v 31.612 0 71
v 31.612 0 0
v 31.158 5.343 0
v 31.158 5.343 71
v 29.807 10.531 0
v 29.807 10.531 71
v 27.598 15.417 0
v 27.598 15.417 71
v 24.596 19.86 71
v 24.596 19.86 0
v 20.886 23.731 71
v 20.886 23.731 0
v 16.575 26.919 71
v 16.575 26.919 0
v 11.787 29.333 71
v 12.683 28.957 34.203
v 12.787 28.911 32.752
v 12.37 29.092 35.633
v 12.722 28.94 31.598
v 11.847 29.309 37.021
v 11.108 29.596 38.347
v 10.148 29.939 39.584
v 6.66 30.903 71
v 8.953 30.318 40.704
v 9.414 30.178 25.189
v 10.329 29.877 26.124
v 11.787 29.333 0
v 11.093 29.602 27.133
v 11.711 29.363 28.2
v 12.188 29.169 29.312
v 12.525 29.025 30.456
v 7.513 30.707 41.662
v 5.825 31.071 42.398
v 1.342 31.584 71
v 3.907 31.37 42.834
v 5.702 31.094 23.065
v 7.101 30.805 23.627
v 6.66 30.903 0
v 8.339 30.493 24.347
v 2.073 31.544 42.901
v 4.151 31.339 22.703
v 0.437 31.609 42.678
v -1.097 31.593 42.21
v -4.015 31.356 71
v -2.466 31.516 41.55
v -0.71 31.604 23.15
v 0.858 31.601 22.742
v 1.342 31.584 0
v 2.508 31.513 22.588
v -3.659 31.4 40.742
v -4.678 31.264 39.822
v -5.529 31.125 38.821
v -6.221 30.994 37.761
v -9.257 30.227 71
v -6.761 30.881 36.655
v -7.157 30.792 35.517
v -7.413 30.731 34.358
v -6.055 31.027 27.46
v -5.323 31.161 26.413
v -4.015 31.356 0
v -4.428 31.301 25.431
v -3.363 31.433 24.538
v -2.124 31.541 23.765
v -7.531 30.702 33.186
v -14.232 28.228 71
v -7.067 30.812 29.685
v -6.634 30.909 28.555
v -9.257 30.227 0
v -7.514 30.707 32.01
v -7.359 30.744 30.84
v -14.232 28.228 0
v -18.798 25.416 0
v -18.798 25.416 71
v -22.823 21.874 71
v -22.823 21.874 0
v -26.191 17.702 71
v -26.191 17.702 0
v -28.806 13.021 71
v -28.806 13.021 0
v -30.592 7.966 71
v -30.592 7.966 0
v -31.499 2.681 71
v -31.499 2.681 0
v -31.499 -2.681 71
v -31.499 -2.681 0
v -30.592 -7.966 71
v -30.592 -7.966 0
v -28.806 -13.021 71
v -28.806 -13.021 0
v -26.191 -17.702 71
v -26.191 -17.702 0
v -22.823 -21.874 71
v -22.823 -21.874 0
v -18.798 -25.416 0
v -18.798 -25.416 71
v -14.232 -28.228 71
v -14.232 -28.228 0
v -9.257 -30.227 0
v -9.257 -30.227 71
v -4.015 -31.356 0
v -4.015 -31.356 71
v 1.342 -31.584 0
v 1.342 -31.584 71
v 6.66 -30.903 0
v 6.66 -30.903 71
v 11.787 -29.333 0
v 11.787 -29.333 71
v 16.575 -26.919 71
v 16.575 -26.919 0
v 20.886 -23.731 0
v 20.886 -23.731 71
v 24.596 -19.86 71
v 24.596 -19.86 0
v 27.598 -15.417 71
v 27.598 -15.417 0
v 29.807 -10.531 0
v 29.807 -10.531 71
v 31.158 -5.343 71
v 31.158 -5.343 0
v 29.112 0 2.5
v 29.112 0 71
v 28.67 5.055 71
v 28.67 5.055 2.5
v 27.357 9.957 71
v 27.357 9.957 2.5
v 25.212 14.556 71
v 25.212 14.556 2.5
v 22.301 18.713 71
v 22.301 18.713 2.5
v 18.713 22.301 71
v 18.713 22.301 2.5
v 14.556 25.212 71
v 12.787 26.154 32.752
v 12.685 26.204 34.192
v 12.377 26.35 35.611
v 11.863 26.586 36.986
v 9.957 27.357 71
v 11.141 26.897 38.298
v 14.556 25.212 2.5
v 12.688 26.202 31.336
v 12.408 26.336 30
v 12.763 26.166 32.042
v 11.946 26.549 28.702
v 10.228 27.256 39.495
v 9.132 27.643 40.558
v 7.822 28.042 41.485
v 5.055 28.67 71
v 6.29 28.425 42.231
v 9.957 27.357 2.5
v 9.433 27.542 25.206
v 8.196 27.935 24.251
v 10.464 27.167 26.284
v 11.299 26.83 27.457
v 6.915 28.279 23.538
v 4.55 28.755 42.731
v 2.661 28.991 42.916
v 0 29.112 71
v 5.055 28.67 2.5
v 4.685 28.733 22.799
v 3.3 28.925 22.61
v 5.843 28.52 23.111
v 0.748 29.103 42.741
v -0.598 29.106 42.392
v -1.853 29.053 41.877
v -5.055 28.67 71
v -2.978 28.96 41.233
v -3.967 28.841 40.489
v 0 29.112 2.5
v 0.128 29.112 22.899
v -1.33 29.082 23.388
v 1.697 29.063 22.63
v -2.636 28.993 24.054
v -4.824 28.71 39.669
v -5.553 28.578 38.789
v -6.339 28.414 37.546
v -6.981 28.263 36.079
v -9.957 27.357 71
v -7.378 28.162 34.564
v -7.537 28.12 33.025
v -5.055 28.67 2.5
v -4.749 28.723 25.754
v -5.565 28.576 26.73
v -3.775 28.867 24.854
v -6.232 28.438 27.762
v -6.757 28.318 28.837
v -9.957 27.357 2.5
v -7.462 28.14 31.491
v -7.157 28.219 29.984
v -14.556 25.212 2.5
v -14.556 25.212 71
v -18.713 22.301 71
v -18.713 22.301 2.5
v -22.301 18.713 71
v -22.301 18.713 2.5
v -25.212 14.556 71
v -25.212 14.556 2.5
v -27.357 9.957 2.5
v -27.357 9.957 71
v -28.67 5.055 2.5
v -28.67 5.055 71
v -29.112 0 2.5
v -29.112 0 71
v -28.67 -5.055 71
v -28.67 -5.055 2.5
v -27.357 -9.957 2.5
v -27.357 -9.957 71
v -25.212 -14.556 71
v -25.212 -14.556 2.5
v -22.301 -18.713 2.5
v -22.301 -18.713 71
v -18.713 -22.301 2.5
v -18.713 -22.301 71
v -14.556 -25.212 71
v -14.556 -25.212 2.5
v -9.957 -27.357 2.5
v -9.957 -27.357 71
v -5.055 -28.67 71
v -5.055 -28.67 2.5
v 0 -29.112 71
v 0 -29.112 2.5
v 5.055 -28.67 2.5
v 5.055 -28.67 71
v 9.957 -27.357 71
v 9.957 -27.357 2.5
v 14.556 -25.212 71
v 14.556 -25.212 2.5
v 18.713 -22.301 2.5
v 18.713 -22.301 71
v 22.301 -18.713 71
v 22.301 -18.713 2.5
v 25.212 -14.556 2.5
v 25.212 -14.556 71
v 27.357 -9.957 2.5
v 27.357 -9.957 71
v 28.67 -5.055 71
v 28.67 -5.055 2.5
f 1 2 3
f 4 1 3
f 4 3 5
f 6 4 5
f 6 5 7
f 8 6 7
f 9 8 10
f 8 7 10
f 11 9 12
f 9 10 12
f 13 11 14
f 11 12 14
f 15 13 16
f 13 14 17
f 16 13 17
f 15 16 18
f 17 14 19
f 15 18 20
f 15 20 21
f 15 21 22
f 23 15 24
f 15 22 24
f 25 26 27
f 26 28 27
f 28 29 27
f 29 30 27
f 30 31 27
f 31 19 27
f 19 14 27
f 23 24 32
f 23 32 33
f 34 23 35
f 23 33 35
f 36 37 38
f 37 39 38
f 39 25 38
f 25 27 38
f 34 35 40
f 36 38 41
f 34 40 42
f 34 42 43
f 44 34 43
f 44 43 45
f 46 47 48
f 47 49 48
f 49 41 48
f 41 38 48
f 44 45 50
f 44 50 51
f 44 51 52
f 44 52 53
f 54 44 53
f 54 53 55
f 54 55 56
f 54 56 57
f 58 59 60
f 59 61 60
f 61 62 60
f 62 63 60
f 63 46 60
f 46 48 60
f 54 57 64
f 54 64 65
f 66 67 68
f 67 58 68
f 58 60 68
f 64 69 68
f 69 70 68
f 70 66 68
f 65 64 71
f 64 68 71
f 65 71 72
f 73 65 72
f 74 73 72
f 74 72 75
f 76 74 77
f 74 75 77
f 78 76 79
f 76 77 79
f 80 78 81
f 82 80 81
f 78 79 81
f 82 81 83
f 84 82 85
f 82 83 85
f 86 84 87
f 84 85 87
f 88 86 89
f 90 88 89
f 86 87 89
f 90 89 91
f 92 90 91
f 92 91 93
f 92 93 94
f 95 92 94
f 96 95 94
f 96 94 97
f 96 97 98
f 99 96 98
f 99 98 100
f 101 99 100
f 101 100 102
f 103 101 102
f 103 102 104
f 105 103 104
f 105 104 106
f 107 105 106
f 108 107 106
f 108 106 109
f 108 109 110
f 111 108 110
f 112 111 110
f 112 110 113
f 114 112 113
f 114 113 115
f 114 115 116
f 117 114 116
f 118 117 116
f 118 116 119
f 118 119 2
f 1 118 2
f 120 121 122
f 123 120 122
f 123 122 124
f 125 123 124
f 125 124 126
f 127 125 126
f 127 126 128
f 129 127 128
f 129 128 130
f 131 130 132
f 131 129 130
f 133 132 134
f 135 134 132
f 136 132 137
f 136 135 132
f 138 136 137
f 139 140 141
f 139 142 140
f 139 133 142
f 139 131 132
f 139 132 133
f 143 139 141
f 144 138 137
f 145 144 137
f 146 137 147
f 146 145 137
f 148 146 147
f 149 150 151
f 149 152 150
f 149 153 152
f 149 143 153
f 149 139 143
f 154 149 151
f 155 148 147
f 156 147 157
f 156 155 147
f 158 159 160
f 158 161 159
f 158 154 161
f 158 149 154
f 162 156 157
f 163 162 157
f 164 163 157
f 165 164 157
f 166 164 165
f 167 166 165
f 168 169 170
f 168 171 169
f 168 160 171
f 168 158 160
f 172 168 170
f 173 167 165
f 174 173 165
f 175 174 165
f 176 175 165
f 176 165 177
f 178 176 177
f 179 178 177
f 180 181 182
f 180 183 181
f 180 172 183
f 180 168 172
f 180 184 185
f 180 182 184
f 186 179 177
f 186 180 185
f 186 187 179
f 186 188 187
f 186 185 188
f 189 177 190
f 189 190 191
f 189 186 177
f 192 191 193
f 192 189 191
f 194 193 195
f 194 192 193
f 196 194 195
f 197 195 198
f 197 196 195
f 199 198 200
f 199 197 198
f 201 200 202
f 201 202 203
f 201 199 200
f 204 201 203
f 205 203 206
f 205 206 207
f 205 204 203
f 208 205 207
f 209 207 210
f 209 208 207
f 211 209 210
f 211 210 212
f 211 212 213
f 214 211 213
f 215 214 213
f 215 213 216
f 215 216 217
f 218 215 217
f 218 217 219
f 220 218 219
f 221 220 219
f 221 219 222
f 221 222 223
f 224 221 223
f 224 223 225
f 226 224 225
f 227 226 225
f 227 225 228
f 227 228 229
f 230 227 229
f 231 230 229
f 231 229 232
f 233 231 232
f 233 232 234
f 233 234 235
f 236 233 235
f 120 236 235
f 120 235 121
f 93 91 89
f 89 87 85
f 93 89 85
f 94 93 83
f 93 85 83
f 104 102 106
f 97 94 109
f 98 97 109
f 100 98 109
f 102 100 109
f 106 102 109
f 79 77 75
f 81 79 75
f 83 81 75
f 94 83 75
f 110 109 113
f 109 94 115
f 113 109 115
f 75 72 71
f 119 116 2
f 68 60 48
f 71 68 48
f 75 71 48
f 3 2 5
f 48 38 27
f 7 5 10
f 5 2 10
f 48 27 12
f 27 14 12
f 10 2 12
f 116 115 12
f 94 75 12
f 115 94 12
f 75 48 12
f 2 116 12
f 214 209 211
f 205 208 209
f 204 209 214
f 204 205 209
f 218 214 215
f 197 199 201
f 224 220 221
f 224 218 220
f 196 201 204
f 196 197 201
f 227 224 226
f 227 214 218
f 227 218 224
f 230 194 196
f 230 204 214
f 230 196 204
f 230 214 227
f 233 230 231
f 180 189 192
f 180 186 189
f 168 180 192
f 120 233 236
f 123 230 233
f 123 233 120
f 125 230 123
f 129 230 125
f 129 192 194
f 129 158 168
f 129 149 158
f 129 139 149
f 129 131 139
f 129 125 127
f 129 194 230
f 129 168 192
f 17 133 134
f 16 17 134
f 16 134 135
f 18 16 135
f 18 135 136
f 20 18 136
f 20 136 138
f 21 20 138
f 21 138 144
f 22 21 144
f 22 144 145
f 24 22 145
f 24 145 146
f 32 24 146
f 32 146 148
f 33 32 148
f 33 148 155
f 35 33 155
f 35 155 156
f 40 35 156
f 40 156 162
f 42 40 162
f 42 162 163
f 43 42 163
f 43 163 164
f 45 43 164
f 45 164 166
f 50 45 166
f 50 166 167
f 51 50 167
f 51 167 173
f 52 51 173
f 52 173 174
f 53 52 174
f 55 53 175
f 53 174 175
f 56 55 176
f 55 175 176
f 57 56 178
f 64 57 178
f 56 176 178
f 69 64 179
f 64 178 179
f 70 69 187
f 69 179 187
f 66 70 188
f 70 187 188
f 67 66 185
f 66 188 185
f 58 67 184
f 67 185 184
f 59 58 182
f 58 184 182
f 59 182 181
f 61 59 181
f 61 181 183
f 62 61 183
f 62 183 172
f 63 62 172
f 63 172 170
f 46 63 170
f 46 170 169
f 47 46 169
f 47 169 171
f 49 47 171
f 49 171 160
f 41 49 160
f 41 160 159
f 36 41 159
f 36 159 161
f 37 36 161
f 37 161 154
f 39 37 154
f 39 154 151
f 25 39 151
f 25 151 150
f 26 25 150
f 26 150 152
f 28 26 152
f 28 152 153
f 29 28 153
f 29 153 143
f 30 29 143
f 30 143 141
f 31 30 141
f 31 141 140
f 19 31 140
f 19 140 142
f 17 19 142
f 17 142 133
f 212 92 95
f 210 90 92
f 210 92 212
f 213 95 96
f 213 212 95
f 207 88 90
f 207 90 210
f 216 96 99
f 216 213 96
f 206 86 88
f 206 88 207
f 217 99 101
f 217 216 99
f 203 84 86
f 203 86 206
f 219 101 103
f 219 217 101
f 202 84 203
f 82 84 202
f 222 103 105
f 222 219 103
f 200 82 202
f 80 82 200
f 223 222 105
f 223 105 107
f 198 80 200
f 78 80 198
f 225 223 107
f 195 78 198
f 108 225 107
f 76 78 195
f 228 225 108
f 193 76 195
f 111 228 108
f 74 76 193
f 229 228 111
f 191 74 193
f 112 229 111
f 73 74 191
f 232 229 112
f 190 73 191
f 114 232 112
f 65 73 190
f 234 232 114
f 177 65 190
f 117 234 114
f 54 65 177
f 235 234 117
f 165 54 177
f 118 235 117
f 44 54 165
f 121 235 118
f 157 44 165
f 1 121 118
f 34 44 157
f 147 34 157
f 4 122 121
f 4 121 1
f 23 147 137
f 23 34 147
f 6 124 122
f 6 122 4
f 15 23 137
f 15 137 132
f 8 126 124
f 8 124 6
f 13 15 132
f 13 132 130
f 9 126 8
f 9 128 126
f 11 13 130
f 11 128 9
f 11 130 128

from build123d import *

# Parameters (mm, degrees)
F0_R     = 31.612422
F1_DEPTH = 71
F2_T     = -2.5
F3_R     = 10.164072
F4_DEPTH = 100


with BuildPart() as f1:
    # F0 (on Top) → F1 (new body)
    with BuildSketch(Plane.XY):
        Circle(F0_R)
    extrude(amount=F1_DEPTH)

    # F2
    f2_openings = [f1.faces().sort_by_distance(p)[0] for p in [
        (0, 0, 71),
    ]]
    offset(amount=F2_T, openings=f2_openings)

    # F3 (on Front) → F4 (cut)
    with BuildSketch(Plane.XZ):
        with Locations((2.623318, 32.751575)):
            Circle(F3_R)
    extrude(amount=-F4_DEPTH, mode=Mode.SUBTRACT)


solid = f1.part
